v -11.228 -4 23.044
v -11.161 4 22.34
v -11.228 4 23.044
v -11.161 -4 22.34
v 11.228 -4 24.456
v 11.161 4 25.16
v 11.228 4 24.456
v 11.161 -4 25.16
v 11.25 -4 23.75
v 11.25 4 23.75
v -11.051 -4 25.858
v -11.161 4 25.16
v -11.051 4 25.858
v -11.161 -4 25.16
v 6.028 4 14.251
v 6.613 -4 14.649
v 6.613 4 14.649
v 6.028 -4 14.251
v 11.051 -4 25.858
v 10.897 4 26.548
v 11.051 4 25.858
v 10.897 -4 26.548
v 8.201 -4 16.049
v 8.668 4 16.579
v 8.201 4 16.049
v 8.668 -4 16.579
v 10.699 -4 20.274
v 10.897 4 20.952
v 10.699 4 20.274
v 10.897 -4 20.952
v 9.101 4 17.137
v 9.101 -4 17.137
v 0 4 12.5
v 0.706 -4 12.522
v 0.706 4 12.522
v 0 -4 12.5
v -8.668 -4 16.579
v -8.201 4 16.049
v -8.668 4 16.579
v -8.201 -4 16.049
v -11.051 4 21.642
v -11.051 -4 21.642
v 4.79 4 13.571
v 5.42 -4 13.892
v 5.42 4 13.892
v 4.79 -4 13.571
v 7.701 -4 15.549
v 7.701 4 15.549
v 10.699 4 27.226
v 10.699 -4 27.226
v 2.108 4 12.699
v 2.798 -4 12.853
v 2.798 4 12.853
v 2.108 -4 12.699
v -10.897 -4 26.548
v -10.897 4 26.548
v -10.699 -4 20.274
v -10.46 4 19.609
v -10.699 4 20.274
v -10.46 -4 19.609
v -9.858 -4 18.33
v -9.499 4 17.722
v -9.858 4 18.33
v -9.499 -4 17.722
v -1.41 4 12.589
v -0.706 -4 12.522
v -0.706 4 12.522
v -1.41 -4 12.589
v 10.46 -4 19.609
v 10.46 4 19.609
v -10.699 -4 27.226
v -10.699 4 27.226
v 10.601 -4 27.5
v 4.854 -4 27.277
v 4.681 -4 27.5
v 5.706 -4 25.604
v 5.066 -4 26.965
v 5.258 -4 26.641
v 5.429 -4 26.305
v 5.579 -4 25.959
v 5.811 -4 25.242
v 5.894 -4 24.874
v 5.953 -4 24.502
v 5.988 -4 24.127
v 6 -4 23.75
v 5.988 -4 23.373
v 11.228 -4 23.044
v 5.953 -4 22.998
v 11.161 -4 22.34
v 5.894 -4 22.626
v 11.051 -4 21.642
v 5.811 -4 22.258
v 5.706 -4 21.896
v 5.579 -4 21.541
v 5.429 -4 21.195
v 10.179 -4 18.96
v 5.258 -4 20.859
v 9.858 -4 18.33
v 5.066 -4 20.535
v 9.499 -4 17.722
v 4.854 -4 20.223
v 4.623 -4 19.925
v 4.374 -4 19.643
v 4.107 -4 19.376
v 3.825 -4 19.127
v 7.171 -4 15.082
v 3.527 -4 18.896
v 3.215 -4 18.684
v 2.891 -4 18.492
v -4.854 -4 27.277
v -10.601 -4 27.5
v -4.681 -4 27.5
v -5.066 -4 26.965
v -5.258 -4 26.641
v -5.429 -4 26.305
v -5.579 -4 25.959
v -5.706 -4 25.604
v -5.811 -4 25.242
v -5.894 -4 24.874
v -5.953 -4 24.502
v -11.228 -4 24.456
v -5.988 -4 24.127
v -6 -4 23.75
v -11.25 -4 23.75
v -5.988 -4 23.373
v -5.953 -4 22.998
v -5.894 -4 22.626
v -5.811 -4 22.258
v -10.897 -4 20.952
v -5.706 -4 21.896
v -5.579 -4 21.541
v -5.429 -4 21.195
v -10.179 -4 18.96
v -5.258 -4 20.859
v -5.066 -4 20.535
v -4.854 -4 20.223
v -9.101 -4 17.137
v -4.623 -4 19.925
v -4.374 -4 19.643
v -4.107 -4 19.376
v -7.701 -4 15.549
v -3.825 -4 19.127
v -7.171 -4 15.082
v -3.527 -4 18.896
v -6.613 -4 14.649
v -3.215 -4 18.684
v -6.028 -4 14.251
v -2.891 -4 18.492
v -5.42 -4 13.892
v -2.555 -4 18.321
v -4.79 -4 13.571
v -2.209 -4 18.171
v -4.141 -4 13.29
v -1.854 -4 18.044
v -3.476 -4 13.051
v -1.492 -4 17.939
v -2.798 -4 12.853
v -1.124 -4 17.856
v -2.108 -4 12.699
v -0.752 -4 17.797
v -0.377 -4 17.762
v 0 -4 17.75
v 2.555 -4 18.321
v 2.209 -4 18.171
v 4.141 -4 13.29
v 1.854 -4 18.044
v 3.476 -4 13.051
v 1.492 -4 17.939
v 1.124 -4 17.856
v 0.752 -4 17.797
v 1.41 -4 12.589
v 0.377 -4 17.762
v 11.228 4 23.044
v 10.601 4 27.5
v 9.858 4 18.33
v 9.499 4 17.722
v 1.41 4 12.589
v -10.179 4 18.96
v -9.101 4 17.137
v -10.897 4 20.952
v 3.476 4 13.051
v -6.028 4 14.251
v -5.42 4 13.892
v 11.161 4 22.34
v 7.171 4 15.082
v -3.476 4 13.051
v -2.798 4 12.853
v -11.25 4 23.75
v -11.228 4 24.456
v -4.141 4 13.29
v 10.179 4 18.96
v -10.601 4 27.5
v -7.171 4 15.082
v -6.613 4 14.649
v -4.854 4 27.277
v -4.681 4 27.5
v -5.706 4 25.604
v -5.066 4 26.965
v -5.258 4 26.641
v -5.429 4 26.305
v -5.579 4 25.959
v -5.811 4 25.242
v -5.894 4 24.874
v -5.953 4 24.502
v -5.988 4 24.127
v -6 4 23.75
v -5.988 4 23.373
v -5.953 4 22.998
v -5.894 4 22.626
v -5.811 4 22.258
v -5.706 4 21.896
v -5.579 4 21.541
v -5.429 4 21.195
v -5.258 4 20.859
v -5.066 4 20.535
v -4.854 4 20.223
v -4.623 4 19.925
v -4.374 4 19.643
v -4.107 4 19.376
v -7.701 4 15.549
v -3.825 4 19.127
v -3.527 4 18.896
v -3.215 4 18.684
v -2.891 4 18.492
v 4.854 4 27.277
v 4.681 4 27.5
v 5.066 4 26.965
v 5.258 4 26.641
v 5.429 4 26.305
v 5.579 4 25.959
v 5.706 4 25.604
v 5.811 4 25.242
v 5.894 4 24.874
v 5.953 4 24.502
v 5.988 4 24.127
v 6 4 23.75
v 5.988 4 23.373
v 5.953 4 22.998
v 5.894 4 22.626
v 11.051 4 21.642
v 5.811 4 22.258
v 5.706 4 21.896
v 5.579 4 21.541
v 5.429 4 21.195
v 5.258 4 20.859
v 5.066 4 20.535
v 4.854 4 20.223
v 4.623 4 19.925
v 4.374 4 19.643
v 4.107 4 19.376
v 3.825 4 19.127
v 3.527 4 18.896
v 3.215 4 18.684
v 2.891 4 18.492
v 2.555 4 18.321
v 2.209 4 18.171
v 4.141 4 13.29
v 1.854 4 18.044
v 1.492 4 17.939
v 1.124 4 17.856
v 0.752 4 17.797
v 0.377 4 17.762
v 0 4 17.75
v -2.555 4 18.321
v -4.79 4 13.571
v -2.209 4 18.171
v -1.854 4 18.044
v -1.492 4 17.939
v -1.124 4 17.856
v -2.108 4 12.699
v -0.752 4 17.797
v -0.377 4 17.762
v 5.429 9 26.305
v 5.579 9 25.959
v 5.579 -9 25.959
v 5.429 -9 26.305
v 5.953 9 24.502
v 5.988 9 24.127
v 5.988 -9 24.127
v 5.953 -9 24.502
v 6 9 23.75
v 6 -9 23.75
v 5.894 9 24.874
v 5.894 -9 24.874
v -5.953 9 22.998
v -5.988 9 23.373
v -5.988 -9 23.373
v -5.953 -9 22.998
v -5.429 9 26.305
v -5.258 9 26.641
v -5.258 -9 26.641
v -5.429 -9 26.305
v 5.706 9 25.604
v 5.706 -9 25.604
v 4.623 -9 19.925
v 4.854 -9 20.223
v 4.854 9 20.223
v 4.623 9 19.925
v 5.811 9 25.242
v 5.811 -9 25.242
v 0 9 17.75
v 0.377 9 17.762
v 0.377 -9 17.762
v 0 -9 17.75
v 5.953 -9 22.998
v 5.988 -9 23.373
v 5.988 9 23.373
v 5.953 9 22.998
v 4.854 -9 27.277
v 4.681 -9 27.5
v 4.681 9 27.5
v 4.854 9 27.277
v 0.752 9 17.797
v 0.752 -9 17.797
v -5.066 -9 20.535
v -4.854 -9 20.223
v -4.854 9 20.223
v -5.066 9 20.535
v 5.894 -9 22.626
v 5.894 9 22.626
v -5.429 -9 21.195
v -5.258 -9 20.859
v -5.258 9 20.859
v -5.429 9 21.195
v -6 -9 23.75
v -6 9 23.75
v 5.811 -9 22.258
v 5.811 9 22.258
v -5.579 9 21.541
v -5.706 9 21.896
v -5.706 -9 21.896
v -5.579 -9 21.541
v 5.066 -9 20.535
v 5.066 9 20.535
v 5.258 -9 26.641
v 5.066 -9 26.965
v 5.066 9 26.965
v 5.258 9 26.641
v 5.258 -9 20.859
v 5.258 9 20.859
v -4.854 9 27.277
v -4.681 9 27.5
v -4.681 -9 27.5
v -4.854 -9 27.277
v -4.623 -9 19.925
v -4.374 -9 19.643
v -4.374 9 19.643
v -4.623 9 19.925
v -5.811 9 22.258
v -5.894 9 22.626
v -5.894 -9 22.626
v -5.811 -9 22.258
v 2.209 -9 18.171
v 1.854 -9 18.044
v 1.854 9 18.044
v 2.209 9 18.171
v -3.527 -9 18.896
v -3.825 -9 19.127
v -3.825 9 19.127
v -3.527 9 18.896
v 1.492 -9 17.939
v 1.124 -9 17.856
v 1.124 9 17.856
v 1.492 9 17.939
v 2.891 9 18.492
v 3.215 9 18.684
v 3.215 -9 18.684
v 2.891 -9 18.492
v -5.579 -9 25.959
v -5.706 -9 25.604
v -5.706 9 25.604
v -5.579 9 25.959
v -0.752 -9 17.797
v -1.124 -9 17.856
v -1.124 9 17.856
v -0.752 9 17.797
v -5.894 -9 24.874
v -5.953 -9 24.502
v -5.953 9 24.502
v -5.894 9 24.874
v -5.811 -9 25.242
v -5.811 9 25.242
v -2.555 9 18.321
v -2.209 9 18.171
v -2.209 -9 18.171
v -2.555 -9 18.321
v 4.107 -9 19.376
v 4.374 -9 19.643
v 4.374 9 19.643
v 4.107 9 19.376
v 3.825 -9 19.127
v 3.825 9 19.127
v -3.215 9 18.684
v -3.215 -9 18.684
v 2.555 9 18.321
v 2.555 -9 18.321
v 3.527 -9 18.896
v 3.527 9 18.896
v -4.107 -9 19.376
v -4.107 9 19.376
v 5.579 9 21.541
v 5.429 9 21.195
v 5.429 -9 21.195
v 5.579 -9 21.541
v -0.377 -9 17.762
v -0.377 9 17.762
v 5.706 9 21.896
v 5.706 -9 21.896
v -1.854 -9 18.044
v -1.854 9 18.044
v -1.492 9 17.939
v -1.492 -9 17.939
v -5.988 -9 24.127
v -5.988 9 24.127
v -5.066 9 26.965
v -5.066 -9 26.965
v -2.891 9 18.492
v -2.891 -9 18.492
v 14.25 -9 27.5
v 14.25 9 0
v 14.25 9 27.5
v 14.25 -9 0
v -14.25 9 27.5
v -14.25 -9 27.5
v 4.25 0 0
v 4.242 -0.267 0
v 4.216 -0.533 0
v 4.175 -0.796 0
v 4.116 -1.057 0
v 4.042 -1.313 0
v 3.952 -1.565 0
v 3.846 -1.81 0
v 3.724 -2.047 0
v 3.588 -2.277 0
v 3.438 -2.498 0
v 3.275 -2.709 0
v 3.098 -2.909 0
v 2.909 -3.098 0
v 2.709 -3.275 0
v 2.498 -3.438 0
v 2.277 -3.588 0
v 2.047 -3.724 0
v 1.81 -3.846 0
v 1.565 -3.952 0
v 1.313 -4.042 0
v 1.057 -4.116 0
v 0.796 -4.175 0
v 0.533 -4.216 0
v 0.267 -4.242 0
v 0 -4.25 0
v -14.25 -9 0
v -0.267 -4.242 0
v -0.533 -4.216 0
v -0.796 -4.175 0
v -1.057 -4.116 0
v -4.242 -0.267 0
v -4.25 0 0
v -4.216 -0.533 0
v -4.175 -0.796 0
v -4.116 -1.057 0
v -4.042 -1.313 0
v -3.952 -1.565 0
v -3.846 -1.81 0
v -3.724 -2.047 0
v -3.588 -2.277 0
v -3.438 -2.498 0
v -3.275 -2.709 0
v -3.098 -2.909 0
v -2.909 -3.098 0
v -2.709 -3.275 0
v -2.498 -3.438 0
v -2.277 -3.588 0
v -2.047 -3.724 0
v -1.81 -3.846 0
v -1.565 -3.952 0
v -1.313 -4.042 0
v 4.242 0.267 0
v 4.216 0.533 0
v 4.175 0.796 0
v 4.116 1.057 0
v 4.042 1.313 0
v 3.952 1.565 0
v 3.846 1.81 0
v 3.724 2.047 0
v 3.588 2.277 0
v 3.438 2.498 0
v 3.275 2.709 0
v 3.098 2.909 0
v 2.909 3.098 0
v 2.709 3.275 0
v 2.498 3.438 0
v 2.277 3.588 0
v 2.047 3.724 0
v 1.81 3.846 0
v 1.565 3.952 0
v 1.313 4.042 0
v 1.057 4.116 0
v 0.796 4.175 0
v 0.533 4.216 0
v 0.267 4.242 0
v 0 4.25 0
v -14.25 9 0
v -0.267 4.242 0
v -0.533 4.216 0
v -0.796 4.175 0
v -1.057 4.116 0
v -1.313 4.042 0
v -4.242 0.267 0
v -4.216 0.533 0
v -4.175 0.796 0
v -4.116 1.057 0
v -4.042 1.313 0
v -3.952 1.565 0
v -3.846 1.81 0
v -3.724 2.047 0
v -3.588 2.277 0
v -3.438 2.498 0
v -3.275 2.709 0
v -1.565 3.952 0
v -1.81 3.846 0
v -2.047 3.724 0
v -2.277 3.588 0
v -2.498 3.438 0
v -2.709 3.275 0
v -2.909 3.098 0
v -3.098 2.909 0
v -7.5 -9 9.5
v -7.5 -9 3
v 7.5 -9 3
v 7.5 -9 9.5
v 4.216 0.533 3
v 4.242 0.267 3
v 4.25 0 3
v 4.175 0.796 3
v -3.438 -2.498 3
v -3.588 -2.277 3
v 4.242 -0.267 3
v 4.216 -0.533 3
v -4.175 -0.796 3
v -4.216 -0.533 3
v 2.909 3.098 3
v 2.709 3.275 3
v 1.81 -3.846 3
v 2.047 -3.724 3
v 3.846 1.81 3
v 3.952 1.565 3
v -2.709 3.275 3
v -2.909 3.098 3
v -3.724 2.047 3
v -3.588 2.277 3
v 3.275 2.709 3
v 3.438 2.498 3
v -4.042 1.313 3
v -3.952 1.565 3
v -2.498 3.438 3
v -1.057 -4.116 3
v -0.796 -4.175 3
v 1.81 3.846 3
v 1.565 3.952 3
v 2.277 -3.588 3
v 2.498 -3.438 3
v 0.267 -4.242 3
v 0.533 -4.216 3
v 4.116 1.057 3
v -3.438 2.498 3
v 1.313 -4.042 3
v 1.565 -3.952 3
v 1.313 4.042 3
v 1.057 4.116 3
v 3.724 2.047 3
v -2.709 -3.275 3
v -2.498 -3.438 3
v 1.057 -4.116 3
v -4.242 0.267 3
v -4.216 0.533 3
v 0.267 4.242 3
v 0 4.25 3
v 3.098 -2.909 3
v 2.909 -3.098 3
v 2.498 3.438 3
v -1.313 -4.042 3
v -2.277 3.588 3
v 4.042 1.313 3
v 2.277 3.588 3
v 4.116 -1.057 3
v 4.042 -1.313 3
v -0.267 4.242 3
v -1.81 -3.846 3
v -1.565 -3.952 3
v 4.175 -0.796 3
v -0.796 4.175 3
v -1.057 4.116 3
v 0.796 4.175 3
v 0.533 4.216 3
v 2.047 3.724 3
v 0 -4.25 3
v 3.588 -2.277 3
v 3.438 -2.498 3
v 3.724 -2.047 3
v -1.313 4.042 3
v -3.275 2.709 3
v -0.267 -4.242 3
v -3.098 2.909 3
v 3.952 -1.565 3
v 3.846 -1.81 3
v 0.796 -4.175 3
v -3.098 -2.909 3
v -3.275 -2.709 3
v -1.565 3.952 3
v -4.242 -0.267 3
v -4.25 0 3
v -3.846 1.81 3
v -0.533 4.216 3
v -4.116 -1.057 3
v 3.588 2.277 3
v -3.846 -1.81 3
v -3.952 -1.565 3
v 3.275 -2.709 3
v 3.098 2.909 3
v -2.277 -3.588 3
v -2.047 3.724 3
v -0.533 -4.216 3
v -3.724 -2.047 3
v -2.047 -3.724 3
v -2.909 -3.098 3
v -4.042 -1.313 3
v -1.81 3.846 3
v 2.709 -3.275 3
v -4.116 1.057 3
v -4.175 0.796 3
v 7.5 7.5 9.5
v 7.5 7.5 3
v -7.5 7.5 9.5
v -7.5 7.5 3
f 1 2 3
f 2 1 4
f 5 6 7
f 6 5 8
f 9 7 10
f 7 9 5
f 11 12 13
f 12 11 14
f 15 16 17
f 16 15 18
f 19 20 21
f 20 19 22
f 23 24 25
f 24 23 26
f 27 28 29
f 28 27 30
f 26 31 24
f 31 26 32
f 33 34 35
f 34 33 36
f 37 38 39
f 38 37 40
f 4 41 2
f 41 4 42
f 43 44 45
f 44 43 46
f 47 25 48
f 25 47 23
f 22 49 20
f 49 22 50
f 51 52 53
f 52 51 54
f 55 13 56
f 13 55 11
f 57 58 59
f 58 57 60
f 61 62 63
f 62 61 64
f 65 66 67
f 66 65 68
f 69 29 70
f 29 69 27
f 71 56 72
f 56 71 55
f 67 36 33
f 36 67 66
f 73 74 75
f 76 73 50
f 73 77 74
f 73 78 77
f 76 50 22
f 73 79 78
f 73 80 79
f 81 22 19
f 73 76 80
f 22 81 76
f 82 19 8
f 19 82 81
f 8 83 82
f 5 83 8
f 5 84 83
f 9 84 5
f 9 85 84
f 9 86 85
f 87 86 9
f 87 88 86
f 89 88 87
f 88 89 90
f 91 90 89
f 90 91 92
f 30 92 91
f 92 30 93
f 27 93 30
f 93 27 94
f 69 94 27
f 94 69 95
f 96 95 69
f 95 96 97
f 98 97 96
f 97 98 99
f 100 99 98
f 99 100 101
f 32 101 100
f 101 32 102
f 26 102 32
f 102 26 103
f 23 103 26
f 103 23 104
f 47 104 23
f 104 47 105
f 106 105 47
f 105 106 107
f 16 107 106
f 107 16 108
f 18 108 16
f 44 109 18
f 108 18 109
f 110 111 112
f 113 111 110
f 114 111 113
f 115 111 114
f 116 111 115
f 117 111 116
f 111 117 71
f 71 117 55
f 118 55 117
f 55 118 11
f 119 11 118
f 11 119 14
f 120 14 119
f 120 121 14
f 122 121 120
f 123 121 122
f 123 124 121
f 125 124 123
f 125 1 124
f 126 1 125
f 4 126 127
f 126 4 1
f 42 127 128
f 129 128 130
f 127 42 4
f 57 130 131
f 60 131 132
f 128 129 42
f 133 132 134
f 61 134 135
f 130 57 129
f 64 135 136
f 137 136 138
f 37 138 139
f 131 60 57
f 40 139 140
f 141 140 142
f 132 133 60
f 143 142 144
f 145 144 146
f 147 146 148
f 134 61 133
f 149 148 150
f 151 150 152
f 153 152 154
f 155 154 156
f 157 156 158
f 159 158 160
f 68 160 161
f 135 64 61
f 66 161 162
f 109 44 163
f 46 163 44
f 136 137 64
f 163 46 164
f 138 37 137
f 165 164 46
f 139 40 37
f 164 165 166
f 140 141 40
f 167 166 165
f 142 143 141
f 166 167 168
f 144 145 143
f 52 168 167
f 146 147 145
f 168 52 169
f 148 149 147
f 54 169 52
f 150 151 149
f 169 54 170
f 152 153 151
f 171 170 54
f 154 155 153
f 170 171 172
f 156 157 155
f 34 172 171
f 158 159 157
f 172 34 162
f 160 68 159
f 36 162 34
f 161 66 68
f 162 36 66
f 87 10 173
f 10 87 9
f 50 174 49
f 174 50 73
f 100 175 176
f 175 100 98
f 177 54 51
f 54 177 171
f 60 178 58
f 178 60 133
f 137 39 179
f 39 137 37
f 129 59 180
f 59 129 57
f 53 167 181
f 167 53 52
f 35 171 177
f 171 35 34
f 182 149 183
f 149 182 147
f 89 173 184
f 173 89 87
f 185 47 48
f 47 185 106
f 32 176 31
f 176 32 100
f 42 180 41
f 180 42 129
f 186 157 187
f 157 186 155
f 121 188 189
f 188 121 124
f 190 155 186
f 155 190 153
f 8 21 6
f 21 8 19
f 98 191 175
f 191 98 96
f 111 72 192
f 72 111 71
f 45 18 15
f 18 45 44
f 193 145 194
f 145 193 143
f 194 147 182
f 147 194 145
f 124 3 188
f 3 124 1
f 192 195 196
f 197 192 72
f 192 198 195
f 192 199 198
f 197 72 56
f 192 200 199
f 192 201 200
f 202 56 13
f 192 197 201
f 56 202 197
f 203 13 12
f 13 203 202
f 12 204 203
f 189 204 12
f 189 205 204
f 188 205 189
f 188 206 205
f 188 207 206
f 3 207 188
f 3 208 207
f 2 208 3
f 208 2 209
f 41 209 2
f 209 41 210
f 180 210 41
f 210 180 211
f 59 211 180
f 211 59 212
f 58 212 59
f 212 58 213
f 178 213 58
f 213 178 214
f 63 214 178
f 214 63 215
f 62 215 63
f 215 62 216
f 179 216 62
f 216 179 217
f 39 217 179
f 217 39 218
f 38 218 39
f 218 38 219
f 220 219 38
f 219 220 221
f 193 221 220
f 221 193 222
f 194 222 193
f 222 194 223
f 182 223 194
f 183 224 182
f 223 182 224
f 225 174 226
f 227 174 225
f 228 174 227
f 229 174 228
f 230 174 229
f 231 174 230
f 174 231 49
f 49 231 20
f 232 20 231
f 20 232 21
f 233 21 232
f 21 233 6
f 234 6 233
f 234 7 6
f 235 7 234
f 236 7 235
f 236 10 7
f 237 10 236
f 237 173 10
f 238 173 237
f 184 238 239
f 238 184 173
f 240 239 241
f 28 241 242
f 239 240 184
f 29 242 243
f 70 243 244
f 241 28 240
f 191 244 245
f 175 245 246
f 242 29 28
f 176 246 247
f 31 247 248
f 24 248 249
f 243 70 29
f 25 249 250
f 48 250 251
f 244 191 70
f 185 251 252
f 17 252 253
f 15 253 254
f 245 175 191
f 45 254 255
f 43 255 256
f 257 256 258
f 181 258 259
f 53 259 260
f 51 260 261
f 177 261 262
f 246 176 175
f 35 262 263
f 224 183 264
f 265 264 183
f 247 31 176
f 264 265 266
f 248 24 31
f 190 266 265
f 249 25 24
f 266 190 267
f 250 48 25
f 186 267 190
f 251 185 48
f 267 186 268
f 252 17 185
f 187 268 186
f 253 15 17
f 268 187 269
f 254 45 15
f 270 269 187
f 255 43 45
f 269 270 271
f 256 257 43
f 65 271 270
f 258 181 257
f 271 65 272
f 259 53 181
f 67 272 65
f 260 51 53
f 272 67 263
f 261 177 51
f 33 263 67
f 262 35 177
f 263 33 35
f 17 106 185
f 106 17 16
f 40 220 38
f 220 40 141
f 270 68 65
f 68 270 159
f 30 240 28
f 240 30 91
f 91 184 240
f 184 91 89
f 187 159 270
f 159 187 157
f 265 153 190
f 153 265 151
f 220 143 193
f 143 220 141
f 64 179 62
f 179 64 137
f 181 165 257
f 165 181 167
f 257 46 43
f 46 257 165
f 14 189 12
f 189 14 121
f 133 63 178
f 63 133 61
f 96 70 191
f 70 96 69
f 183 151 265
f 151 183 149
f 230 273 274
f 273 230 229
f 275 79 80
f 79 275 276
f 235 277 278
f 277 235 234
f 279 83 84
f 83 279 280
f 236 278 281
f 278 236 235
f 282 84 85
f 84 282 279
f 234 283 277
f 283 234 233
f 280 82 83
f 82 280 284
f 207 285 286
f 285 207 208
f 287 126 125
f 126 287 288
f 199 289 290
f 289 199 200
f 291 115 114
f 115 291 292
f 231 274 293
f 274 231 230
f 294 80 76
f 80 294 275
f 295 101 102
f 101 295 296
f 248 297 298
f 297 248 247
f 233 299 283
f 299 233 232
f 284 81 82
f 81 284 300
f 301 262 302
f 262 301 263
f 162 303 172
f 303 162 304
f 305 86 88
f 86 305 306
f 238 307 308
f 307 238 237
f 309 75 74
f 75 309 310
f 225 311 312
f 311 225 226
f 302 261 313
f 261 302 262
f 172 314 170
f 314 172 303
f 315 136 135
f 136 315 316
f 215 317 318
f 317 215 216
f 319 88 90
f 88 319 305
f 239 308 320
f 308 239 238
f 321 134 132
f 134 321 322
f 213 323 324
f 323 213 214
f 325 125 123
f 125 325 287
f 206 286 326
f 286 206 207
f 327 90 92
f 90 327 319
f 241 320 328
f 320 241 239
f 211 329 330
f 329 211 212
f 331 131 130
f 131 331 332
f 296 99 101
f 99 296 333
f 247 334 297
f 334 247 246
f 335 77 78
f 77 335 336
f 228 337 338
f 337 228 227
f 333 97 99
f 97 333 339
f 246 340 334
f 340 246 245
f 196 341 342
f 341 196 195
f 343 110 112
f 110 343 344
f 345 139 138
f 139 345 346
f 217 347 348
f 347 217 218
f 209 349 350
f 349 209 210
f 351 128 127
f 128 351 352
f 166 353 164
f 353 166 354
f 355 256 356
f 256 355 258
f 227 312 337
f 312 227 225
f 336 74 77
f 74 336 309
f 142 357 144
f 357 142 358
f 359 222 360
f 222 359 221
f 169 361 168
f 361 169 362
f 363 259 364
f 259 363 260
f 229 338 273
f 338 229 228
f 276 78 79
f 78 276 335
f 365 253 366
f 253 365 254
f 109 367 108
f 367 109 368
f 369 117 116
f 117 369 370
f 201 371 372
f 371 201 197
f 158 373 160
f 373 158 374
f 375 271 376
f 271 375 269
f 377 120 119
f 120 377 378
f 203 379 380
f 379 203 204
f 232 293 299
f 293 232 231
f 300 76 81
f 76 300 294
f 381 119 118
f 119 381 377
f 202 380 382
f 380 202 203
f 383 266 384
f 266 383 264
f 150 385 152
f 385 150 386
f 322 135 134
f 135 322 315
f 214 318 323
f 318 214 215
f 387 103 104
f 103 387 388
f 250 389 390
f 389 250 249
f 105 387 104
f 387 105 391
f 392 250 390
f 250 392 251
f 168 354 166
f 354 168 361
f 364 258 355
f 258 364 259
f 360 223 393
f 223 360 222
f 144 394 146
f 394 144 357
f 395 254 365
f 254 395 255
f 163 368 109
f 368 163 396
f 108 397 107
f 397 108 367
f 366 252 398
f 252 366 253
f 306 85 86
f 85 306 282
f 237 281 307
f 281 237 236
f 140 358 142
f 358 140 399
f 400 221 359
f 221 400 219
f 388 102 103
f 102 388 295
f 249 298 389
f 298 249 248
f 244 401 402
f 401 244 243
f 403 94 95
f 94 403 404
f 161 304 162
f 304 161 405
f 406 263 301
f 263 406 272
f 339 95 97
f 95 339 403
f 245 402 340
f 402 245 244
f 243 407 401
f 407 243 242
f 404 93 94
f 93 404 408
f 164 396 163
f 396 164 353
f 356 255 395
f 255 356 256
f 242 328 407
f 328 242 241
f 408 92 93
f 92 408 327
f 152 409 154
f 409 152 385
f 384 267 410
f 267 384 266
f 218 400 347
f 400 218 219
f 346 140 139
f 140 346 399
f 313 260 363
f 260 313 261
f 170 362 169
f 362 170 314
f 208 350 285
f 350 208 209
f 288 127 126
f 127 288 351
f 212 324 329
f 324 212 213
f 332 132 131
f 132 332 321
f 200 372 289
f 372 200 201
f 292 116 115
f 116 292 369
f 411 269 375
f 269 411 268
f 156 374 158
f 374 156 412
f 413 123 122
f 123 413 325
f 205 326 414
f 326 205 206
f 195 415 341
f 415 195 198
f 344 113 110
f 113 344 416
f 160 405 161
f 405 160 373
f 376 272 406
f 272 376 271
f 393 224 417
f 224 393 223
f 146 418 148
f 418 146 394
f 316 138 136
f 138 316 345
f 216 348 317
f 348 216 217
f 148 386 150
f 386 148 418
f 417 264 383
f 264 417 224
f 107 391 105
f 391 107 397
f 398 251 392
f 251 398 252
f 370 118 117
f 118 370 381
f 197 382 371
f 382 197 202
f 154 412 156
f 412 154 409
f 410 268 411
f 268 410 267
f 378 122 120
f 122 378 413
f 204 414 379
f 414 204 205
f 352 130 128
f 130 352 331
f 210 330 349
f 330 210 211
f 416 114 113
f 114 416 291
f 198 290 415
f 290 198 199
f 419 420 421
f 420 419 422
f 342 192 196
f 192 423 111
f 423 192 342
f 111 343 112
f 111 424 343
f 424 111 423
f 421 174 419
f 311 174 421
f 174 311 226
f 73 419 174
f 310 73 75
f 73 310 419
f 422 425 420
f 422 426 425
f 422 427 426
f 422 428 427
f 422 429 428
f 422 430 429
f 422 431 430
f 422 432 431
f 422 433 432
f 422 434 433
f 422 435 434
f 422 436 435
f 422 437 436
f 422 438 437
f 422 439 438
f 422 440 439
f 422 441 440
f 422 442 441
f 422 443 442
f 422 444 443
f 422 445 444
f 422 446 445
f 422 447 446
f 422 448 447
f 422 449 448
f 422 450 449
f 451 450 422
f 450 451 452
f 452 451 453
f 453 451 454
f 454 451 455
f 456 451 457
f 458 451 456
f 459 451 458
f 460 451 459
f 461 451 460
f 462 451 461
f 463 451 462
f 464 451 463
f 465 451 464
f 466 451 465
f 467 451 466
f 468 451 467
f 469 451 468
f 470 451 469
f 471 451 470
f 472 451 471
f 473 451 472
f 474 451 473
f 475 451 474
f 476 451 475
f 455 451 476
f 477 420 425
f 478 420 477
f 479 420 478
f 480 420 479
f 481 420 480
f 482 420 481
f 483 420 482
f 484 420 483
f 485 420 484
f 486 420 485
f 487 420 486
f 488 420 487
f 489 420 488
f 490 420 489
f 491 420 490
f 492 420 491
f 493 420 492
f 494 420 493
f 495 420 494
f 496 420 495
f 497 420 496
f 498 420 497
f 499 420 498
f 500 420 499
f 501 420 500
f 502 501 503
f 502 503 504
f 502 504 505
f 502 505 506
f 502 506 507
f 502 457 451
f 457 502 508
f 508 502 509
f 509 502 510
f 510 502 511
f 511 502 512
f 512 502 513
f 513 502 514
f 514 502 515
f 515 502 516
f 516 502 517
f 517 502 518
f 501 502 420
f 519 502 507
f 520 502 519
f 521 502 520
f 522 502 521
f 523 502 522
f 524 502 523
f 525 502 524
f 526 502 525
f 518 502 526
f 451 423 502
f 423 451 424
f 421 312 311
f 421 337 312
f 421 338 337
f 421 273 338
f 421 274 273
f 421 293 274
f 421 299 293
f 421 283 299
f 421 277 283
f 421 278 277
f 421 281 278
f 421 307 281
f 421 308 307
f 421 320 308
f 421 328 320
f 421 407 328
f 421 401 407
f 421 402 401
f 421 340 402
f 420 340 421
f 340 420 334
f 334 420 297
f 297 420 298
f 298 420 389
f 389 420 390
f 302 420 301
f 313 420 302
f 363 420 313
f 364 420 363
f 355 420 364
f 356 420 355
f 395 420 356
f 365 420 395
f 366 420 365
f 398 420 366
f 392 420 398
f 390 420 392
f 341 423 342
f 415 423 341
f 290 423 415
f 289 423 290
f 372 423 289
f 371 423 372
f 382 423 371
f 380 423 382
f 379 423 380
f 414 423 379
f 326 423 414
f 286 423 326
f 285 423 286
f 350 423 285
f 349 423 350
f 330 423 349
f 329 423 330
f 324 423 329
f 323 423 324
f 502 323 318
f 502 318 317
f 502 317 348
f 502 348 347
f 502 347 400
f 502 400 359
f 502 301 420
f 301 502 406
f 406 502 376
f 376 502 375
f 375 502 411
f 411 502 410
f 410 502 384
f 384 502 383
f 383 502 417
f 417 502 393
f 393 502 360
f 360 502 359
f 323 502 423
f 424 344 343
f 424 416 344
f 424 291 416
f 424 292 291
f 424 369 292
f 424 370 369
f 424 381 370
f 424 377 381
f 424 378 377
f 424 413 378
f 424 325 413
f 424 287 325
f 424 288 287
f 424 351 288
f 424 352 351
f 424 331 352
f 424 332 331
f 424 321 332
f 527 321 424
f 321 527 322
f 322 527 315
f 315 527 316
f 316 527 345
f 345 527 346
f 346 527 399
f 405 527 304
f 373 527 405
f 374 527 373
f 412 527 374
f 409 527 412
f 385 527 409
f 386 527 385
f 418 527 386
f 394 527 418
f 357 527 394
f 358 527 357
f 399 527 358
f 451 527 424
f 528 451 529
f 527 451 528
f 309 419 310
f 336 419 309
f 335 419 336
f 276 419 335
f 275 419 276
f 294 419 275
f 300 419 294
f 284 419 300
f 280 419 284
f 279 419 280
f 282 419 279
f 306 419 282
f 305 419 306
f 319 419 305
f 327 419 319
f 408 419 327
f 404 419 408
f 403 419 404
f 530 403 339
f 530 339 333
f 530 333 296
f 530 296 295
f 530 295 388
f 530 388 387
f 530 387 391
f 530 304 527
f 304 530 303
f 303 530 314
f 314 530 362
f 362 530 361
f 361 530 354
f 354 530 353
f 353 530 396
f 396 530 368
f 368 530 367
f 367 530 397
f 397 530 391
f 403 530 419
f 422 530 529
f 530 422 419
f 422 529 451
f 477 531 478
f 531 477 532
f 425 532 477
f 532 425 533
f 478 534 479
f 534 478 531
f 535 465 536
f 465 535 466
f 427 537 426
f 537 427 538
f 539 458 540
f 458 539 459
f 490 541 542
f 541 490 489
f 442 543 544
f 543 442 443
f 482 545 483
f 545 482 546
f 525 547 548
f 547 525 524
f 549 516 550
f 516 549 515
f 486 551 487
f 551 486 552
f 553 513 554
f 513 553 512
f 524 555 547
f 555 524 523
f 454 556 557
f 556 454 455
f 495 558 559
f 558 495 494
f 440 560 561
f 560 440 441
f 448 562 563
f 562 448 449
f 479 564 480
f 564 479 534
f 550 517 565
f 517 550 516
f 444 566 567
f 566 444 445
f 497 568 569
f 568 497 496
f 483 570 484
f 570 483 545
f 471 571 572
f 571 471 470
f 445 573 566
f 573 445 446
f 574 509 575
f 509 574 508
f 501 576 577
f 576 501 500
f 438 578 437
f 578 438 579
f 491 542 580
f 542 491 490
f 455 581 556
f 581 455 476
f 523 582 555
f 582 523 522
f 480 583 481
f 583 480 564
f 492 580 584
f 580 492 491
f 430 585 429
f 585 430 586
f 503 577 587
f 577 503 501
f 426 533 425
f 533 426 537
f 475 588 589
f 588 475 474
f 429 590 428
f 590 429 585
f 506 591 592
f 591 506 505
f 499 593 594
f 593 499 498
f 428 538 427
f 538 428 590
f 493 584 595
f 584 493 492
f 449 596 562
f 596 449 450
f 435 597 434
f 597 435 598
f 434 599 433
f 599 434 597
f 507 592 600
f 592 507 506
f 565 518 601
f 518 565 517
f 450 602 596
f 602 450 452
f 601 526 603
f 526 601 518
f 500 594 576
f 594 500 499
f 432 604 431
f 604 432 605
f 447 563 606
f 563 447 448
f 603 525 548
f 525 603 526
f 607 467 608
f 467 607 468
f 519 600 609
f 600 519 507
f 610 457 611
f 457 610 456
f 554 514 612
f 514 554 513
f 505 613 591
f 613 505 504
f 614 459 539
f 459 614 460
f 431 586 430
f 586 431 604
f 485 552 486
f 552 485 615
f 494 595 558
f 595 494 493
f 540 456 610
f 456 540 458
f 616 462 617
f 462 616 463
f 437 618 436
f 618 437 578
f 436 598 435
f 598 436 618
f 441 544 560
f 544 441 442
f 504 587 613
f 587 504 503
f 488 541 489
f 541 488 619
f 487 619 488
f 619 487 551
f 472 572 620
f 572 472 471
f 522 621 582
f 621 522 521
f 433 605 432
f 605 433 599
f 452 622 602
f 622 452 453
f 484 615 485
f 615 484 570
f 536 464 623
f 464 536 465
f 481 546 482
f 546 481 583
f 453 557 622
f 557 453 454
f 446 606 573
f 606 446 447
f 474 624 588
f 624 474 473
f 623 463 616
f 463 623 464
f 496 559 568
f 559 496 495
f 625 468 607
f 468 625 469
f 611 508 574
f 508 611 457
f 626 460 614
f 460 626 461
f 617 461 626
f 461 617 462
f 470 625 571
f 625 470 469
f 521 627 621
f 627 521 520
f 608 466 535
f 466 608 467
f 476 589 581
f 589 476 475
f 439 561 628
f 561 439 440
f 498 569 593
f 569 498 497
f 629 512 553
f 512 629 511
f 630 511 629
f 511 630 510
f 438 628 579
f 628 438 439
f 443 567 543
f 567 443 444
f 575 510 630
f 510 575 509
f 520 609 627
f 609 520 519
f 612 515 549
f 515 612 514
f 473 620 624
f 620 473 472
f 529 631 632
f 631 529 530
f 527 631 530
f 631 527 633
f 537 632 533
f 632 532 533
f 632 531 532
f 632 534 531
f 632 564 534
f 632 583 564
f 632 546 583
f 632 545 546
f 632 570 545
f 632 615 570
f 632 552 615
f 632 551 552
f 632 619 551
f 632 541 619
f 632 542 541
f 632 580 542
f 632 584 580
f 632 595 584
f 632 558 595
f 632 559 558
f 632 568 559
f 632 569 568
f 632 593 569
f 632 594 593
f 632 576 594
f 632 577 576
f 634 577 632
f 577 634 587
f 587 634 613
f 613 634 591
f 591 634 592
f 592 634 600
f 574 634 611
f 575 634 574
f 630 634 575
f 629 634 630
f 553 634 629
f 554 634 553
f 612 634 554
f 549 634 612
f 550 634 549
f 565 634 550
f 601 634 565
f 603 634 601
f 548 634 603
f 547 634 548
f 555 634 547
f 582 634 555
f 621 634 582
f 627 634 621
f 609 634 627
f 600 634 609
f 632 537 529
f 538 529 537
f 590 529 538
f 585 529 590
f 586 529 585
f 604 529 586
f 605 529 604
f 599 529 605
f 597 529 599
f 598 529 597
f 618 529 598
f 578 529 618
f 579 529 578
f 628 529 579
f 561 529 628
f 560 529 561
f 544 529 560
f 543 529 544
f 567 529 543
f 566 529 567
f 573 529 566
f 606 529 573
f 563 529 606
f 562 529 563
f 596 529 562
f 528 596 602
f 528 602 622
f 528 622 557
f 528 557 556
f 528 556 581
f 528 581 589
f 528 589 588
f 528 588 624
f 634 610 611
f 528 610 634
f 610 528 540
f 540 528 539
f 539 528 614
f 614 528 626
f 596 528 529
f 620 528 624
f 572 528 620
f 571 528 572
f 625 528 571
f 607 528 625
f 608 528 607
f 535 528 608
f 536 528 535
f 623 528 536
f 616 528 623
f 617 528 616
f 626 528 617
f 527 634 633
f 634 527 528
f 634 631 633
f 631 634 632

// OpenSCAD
M8BoltThick = 6.5;
M8BoltWidth = 15;
M8BoltHoleDiameter = 8.5;
Bearing608zzThick = 8;
Bearing608zzDiameter = 22.5;
M8ThreadDiameter = 12;
XWallThick = 3;
YWallThick = 5;
ZWallThick = 3;

difference() {
    translate([-(XWallThick*2+Bearing608zzDiameter)/2, -(YWallThick*2+Bearing608zzThick)/2, 0]) {
        cube([XWallThick*2+Bearing608zzDiameter, YWallThick*2+Bearing608zzThick, ZWallThick*2 + M8BoltThick + Bearing608zzDiameter*2/3]);
    }
    translate([0,0,-1]) {
        cylinder(r=M8BoltHoleDiameter/2, h=ZWallThick+1.01, $fn=100);
    }
    translate([-M8BoltWidth/2,-M8BoltWidth/2-YWallThick-1,ZWallThick]) {
        cube([M8BoltWidth, M8BoltWidth+YWallThick+1, M8BoltThick]);
    }
    translate([0,0,ZWallThick*2+M8BoltThick+Bearing608zzDiameter/2]) {
        rotate([90,0,0]) {
            cylinder(r=Bearing608zzDiameter/2, h=Bearing608zzThick, $fn=100, center=true);
            cylinder(r=M8ThreadDiameter/2, h=Bearing608zzThick+YWallThick*2+2, $fn=100, center=true);
        }
    }
}
